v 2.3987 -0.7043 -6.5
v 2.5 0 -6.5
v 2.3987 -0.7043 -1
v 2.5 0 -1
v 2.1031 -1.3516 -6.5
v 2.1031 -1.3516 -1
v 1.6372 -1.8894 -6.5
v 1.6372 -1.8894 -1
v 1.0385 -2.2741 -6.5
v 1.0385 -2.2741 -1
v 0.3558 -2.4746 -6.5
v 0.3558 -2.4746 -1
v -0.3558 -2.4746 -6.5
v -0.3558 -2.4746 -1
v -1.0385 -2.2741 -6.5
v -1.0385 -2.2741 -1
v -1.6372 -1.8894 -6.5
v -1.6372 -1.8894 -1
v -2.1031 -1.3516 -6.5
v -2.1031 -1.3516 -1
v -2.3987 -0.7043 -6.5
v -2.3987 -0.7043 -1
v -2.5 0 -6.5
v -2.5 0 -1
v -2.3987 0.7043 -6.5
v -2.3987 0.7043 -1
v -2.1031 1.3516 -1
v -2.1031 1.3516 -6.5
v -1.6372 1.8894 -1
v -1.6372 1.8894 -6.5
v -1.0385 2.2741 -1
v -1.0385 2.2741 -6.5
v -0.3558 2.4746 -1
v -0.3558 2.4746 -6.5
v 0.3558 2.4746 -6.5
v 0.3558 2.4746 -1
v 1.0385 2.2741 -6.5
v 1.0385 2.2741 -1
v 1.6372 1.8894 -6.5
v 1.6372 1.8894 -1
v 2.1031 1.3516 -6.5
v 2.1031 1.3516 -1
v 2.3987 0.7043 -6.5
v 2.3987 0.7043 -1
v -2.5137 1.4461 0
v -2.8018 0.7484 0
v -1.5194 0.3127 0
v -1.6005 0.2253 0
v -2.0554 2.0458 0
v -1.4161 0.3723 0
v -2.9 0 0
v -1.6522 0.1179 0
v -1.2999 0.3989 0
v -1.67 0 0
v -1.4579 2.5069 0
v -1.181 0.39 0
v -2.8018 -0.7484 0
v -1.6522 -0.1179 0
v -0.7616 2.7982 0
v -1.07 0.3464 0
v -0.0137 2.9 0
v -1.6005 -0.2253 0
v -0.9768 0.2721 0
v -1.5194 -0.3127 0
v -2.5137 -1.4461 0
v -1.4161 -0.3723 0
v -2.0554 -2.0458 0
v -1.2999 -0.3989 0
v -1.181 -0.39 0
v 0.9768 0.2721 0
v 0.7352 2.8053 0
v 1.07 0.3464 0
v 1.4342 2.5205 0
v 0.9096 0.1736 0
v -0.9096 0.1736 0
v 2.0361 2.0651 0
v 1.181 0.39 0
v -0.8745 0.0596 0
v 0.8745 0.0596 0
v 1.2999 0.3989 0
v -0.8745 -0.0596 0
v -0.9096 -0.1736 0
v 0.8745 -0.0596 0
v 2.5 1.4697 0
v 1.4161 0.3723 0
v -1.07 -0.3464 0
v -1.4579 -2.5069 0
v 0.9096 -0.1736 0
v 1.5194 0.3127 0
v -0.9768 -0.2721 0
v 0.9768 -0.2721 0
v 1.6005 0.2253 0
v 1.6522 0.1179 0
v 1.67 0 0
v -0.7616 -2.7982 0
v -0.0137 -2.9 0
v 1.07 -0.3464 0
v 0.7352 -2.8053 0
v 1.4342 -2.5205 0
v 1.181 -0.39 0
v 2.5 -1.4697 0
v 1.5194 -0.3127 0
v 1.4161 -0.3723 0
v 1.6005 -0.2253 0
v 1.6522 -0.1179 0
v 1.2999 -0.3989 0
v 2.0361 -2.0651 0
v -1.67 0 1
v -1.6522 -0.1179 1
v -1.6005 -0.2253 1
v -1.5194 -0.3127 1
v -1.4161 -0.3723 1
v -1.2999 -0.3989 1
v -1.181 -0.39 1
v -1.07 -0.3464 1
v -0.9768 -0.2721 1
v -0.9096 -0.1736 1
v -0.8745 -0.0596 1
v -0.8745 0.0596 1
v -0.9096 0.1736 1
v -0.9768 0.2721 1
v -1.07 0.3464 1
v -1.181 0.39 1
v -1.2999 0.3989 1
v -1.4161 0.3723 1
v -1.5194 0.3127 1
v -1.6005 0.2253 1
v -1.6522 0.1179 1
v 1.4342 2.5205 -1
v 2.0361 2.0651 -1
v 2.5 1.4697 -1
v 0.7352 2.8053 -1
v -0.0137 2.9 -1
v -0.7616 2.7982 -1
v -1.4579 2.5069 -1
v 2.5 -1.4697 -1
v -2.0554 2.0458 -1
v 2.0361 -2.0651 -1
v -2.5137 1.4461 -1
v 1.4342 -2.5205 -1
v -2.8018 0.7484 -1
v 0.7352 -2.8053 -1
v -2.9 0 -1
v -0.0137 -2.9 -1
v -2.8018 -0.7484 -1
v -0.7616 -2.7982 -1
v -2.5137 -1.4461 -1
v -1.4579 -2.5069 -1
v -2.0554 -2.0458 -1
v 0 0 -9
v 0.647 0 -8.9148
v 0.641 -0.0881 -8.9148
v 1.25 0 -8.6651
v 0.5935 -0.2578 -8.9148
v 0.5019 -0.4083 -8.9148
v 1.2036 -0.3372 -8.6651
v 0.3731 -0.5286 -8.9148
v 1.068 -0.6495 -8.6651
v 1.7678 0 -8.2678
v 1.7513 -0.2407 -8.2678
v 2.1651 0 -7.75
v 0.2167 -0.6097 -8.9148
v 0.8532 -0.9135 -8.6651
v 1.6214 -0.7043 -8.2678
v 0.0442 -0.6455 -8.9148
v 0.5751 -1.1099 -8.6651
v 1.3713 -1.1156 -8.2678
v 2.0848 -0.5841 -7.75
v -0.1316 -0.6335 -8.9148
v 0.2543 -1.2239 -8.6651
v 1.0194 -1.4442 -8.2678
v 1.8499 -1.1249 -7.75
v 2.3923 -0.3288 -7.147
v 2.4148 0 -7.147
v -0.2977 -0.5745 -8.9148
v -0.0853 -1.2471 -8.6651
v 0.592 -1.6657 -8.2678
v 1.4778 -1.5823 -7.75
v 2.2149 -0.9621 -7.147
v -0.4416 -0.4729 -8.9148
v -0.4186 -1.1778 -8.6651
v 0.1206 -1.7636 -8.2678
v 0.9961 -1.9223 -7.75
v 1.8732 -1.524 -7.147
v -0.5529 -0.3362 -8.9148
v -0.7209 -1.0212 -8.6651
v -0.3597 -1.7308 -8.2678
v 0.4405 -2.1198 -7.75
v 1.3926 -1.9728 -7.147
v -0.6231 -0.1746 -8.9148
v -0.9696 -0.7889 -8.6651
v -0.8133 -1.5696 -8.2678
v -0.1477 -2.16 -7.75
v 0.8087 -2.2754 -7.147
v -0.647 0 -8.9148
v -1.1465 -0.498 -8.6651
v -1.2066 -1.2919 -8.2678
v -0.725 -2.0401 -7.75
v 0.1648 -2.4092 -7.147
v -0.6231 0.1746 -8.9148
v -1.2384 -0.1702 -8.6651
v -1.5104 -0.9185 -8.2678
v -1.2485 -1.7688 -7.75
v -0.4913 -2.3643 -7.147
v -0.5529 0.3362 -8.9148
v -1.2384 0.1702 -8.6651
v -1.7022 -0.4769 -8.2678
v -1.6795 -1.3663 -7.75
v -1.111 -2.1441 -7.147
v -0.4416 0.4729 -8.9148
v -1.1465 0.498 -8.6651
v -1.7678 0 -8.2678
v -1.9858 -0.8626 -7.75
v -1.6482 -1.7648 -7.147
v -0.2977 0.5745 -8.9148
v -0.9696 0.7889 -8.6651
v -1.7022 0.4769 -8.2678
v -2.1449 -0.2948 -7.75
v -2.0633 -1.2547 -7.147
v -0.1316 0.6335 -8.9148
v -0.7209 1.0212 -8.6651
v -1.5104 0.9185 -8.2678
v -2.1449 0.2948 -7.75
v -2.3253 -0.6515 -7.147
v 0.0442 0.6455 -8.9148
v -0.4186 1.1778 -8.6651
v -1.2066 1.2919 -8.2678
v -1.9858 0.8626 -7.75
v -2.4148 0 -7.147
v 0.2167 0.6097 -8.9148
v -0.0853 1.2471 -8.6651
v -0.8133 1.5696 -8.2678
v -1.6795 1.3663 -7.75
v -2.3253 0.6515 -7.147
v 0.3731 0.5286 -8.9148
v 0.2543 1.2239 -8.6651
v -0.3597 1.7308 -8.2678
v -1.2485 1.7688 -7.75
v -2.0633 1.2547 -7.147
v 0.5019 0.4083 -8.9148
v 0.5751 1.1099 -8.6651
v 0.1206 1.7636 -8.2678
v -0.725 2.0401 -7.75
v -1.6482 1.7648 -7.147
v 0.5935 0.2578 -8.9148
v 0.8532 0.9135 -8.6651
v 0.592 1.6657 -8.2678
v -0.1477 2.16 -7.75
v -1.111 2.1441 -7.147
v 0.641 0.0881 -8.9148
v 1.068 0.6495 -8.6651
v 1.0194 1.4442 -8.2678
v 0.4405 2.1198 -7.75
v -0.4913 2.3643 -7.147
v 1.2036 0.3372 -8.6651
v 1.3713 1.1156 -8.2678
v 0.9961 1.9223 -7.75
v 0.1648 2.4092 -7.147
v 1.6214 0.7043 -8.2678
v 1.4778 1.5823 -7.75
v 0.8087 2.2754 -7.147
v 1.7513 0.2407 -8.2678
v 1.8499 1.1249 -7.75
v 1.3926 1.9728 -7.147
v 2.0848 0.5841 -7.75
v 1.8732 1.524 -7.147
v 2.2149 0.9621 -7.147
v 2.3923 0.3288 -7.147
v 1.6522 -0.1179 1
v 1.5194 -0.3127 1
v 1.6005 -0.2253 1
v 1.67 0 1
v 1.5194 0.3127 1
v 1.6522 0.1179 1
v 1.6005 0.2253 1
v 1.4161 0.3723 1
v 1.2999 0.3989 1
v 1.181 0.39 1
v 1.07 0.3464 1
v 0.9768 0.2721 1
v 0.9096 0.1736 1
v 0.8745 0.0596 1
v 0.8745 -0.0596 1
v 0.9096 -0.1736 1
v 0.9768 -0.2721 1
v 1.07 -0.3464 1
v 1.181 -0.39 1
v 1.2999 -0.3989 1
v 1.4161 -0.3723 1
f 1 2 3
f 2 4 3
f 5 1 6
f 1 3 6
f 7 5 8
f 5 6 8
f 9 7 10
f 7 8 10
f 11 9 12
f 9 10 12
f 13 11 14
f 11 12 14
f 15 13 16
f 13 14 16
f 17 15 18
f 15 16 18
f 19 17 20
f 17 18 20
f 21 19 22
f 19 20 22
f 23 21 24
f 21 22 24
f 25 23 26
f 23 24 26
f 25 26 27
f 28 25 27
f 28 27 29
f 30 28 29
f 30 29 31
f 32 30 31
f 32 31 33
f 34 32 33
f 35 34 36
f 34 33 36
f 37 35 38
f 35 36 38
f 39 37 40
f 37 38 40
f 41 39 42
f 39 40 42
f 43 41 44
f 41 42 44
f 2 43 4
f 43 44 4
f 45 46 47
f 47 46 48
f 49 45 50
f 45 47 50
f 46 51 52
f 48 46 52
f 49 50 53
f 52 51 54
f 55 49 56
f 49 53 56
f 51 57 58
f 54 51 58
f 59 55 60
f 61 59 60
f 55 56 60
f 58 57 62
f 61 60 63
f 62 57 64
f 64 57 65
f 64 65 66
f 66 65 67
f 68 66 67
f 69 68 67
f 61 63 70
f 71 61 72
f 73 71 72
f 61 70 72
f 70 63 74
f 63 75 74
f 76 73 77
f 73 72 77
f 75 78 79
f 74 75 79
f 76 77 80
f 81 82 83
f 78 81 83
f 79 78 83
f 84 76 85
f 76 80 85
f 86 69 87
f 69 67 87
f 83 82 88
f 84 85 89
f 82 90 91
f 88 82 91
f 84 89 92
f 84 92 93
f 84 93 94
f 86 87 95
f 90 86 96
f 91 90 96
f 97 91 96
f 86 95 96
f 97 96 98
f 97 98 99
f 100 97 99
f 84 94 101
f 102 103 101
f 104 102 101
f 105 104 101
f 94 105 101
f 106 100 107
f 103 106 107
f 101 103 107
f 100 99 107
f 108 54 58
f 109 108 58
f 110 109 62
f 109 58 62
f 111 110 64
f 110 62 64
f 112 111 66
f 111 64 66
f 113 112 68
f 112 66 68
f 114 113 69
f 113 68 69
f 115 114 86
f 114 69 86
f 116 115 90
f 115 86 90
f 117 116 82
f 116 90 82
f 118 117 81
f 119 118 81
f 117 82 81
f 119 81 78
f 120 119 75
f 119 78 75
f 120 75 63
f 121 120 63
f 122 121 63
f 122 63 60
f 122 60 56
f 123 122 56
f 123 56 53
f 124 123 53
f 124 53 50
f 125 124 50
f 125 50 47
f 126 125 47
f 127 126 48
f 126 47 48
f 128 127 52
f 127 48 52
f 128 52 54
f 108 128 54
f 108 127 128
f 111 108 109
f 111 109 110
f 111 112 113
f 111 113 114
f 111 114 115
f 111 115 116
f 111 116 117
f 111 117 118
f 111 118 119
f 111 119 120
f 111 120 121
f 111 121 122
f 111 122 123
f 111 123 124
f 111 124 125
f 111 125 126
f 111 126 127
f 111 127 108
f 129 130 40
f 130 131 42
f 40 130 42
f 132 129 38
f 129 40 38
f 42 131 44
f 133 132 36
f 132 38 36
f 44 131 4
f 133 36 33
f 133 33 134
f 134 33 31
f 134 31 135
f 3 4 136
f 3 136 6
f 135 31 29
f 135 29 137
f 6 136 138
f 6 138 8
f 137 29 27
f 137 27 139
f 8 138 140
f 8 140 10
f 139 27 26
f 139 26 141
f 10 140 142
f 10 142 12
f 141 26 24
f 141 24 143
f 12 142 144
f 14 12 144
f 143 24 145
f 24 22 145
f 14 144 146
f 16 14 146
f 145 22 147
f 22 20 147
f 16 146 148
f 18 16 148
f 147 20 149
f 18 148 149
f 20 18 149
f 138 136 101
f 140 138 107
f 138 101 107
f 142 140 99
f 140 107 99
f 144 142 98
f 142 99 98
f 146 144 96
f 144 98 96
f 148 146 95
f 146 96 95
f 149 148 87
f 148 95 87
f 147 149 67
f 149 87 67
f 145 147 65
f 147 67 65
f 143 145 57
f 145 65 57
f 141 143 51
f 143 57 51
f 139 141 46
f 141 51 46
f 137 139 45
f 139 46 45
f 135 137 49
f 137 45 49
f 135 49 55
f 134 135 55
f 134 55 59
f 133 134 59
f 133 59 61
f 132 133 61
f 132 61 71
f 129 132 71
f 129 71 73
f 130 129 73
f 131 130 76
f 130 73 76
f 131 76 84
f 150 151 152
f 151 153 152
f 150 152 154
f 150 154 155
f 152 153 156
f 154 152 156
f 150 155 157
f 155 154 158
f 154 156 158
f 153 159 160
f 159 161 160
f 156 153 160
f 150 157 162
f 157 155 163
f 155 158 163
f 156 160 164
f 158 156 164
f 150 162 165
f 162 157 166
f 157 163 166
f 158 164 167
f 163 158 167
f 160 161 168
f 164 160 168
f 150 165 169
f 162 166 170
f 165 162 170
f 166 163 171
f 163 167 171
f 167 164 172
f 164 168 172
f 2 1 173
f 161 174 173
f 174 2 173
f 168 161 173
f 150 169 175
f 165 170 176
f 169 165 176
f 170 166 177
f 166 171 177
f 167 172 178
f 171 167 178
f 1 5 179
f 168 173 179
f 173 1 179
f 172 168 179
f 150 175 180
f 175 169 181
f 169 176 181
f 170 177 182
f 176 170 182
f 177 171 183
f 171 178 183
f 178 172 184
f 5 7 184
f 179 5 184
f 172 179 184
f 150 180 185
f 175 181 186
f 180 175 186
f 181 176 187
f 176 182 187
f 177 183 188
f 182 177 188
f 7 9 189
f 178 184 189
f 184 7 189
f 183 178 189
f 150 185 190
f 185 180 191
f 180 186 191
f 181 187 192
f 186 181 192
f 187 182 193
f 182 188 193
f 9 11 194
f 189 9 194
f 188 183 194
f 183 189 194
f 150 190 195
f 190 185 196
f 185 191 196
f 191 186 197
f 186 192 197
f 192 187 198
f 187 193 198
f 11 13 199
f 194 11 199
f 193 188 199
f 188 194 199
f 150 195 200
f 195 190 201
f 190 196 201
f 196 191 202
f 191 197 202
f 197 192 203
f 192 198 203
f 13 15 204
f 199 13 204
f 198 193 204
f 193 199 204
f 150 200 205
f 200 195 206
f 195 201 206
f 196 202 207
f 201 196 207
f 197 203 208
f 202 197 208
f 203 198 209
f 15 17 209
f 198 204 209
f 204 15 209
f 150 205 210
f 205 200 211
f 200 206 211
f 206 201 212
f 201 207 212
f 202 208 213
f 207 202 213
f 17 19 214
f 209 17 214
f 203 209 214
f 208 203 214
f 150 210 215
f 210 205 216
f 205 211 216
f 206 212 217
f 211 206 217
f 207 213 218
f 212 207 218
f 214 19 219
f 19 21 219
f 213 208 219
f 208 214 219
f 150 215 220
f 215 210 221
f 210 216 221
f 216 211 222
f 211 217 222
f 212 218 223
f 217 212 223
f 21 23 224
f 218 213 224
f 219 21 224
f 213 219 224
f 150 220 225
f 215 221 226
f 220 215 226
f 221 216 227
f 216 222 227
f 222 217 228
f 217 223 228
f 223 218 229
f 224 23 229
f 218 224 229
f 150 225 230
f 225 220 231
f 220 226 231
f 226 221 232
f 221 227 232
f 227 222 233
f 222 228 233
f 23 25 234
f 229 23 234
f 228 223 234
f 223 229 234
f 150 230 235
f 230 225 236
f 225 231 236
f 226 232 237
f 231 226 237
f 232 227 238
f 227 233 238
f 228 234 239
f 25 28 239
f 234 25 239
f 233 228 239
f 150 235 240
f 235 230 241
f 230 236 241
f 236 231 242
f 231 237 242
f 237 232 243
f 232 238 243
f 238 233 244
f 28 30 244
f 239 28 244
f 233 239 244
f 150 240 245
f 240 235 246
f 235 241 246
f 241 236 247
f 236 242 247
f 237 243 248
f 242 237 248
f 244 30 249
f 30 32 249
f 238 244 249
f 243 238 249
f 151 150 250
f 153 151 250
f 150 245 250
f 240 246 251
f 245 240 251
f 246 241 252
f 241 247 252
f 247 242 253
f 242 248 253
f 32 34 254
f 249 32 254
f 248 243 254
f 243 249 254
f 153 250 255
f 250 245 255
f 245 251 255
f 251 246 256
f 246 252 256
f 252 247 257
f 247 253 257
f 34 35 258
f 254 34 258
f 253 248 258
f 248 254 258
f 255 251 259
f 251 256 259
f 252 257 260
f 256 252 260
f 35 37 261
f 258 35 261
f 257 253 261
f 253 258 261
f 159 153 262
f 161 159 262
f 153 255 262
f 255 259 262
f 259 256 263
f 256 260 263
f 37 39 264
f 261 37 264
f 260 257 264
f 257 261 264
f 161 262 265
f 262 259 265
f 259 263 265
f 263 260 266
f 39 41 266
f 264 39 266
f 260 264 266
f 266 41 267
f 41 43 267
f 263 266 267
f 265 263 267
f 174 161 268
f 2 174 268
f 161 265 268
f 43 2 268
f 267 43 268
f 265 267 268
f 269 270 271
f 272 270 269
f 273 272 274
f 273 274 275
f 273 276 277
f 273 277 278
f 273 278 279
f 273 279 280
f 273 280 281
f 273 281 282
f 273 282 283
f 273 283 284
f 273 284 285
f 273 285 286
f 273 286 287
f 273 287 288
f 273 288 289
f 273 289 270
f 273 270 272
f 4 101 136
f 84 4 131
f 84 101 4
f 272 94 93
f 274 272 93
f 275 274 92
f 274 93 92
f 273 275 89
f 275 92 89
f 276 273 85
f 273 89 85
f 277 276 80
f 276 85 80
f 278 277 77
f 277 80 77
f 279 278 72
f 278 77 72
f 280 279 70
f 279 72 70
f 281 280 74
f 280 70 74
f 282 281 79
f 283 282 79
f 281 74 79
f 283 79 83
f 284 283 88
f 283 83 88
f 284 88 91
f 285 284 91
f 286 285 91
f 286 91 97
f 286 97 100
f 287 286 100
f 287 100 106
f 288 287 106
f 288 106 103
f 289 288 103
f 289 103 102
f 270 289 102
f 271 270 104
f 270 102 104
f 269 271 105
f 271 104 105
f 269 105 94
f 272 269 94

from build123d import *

# Parameters (mm, degrees)
SKETCH2_W           = 0.4
SKETCH2_H           = 2.939387692
CUT_EXTRUDE1_DEPTH  = 10.890399385
SKETCH3_R           = 0.4
BOSS_EXTRUDE1_DEPTH = 1


with BuildPart() as part:
    # Sketch1 → Revolve1 (revolve)
    with BuildSketch(Plane(origin=(0, 0, 0), x_dir=(1, 0, 0), z_dir=(0, 1, 0))):
        with BuildLine():
            Line((0, 0), (0, 9))
            ThreePointArc((0, 9), (1.767766953, 8.267766953), (2.5, 6.5))
            Line((2.5, 6.5), (2.5, 1))
            Line((2.5, 1), (2.9, 1))
            Line((2.9, 1), (2.9, 0))
            Line((2.9, 0), (0, 0))
        make_face()
    revolve(axis=Axis((0, 0, 0), (0, 0, -1)))

    # Sketch2 → Cut-Extrude1 (cut, through all)
    with BuildSketch(Plane.XY):
        with Locations((2.7, 0)):
            Rectangle(SKETCH2_W, SKETCH2_H)
    extrude(amount=-CUT_EXTRUDE1_DEPTH, mode=Mode.SUBTRACT)

    # Sketch3 → Boss-Extrude1 (add)
    with BuildSketch(Plane.XY):
        with Locations((1.27, 0)):
            Circle(SKETCH3_R)
        with Locations(Location((-1.27, 0, 0), (0, 0, 180))):
            Circle(SKETCH3_R)
    extrude(amount=BOSS_EXTRUDE1_DEPTH)


solid = part.part
